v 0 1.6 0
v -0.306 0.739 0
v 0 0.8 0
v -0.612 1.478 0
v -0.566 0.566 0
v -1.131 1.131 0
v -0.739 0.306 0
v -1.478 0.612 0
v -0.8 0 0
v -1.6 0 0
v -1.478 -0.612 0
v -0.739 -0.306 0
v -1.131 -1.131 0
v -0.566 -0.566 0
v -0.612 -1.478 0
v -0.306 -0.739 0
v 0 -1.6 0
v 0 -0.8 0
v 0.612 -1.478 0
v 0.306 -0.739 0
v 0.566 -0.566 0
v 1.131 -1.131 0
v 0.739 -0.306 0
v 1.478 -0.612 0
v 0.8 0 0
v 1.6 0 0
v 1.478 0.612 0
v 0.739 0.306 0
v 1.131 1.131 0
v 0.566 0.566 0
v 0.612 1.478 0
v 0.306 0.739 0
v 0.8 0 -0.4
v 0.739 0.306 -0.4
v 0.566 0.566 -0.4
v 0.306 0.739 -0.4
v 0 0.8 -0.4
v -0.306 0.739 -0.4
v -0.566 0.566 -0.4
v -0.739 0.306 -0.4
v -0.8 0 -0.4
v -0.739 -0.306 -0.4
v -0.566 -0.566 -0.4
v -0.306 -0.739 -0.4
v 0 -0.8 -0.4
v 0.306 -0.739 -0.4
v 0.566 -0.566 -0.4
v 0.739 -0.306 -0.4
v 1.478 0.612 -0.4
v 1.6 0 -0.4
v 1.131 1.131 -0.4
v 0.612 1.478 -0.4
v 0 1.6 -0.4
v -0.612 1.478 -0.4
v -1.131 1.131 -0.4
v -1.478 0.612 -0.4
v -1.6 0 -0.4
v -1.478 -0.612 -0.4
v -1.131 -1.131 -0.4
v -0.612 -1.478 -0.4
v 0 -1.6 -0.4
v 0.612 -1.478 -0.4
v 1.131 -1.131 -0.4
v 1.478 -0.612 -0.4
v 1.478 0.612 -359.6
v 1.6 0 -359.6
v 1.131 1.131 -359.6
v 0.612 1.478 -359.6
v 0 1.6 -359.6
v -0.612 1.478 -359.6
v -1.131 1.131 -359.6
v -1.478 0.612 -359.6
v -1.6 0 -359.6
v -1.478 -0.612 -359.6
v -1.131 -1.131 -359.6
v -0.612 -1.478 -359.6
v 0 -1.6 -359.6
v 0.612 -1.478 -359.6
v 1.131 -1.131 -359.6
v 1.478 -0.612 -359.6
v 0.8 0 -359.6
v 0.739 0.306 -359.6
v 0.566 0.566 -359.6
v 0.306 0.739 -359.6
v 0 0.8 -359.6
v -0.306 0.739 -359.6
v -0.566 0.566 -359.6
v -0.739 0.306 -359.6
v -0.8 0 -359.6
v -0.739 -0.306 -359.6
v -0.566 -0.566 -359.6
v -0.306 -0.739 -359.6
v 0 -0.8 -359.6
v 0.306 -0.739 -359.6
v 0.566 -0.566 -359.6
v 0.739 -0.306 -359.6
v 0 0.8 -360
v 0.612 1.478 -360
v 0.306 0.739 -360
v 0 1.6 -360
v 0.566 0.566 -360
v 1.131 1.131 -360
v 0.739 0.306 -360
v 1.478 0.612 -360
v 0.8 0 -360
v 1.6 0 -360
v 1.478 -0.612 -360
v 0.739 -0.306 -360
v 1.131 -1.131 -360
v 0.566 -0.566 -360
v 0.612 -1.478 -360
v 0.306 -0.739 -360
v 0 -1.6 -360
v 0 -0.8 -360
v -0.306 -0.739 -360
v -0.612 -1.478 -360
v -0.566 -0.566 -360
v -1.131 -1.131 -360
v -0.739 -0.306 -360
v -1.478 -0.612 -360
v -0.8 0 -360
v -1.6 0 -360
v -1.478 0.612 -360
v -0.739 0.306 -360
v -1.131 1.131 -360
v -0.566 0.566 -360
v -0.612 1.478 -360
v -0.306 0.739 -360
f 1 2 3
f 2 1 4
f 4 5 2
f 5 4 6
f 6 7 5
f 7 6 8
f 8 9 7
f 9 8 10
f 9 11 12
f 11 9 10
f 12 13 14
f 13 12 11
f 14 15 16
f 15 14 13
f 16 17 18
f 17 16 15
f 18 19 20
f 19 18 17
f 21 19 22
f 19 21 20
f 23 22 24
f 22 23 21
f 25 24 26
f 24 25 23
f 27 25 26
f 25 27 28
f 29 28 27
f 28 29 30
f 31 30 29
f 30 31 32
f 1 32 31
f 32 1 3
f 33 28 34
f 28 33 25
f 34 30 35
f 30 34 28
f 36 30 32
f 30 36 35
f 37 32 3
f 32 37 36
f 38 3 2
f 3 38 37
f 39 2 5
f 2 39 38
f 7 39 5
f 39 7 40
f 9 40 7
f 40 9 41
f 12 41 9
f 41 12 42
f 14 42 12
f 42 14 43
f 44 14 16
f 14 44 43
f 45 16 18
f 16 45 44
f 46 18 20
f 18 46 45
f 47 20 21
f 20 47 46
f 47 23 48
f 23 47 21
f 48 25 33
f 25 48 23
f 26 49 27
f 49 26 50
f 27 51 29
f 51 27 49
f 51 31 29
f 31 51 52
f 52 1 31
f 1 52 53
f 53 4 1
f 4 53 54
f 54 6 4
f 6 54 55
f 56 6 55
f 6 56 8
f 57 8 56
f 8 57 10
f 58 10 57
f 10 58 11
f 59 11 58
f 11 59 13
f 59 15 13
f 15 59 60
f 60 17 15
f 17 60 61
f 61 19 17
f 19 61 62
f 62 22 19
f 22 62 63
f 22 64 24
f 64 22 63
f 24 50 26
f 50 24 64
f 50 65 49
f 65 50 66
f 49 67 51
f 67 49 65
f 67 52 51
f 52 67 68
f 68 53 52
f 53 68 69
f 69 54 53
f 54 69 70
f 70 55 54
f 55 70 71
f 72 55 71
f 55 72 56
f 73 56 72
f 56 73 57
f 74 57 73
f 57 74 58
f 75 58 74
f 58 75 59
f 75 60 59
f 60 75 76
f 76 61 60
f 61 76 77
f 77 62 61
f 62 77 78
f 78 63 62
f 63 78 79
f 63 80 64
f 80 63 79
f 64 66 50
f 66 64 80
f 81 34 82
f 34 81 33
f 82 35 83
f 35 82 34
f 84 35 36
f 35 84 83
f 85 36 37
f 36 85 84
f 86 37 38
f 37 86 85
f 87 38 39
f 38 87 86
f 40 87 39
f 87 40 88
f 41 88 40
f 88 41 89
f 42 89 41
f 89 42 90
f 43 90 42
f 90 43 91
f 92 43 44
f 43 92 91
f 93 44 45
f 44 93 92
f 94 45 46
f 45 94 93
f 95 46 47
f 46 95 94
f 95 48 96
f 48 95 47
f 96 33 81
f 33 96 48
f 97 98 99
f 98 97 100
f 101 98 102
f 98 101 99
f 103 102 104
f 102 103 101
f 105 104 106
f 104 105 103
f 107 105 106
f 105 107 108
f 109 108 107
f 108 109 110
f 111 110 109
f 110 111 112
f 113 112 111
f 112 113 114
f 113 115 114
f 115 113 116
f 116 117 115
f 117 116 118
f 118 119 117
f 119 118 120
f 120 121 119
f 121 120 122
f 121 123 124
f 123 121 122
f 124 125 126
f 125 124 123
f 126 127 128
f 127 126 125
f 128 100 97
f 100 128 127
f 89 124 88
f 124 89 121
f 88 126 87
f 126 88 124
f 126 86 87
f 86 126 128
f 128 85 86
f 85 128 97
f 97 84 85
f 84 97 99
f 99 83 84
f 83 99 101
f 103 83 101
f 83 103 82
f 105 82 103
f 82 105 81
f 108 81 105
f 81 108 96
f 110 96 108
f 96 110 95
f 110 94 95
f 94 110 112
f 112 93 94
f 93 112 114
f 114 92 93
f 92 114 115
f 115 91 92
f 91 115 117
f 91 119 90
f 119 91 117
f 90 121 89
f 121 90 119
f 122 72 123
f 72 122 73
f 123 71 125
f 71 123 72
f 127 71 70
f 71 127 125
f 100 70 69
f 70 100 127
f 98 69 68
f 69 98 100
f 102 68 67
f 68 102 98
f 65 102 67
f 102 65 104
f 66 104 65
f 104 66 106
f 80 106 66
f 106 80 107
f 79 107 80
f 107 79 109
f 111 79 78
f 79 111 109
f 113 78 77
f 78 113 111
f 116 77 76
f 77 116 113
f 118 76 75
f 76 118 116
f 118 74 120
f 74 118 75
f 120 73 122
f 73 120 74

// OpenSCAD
// file: ../p/4-4ring1.scad
use <../lib.scad>
function ldraw_lib__4_4ring1() = [
// 0 Ring  1 x 1.0
// 0 Name: 4-4ring1.dat
// 0 Author: James Jessiman
// 0 !LDRAW_ORG Primitive UPDATE 2009-01
// 0 !LICENSE Licensed under CC BY 2.0 and CC BY 4.0 : see CAreadme.txt
// 
// 0 BFC CERTIFY CCW
  [0,"BFC","CERTIFY"],
  [0,"BFC","CCW"],
// 
// 0 !HISTORY 1998-12-15 [PTadmin] Official Update 1998-10
// 0 !HISTORY 2002-04-08 [BrickCaster] Modified for BFC compliance
// 0 !HISTORY 2002-04-25 [PTadmin] Official Update 2002-02
// 0 !HISTORY 2007-06-24 [PTadmin] Header formatted for Contributor Agreement
// 0 !HISTORY 2008-07-01 [PTadmin] Official Update 2008-01
// 0 !HISTORY 2008-08-26 [cwdee] Switch polygon winding and rename
// 0 !HISTORY 2009-05-02 [PTadmin] Official Update 2009-01
// 
// 
// 4 16 -0.7654 0 1.8478 -0.3827 0 0.9239 0 0 1 0 0 2
  [4,16,-0.7654,0,1.8478,-0.3827,0,0.9239,0,0,1,0,0,2],
// 4 16 -1.4142 0 1.4142 -0.7071 0 0.7071 -0.3827 0 0.9239 -0.7654 0 1.8478
  [4,16,-1.4142,0,1.4142,-0.7071,0,0.7071,-0.3827,0,0.9239,-0.7654,0,1.8478],
// 4 16 -1.8478 0 0.7654 -0.9239 0 0.3827 -0.7071 0 0.7071 -1.4142 0 1.41420
  [4,16,-1.8478,0,0.7654,-0.9239,0,0.3827,-0.7071,0,0.7071,-1.4142,0,1.41420],
// 4 16 -2 0 0 -1 0 0 -0.9239 0 0.3827 -1.8478 0 0.7654
  [4,16,-2,0,0,-1,0,0,-0.9239,0,0.3827,-1.8478,0,0.7654],
// 4 16 -1.8478 0 -0.7654 -0.9239 0 -0.3827 -1 0 0 -2 0 0
  [4,16,-1.8478,0,-0.7654,-0.9239,0,-0.3827,-1,0,0,-2,0,0],
// 4 16 -1.4142 0 -1.4142 -0.7071 0 -0.7071 -0.9239 0 -0.3827 -1.8478 0 -0.7654
  [4,16,-1.4142,0,-1.4142,-0.7071,0,-0.7071,-0.9239,0,-0.3827,-1.8478,0,-0.7654],
// 4 16 -0.7654 0 -1.8478 -0.3827 0 -0.9239 -0.7071 0 -0.7071 -1.4142 0 -1.4142
  [4,16,-0.7654,0,-1.8478,-0.3827,0,-0.9239,-0.7071,0,-0.7071,-1.4142,0,-1.4142],
// 4 16 0 0 -2 0 0 -1 -0.3827 0 -0.9239 -0.7654 0 -1.8478
  [4,16,0,0,-2,0,0,-1,-0.3827,0,-0.9239,-0.7654,0,-1.8478],
// 4 16 0.7654 0 -1.8478 0.3827 0 -0.9239 0 0 -1 0 0 -2
  [4,16,0.7654,0,-1.8478,0.3827,0,-0.9239,0,0,-1,0,0,-2],
// 4 16 1.4142 0 -1.4142 0.7071 0 -0.7071 0.3827 0 -0.9239 0.7654 0 -1.8478
  [4,16,1.4142,0,-1.4142,0.7071,0,-0.7071,0.3827,0,-0.9239,0.7654,0,-1.8478],
// 4 16 1.8478 0 -0.7654 0.9239 0 -0.3827 0.7071 0 -0.7071 1.4142 0 -1.4142
  [4,16,1.8478,0,-0.7654,0.9239,0,-0.3827,0.7071,0,-0.7071,1.4142,0,-1.4142],
// 4 16 2 0 0 1 0 0 0.9239 0 -0.3827 1.8478 0 -0.7654
  [4,16,2,0,0,1,0,0,0.9239,0,-0.3827,1.8478,0,-0.7654],
// 4 16 1.8478 0 0.7654 0.9239 0 0.3827 1 0 0 2 0 0
  [4,16,1.8478,0,0.7654,0.9239,0,0.3827,1,0,0,2,0,0],
// 4 16 1.4142 0 1.4142 0.7071 0 0.7071 0.9239 0 0.3827 1.8478 0 0.7654
  [4,16,1.4142,0,1.4142,0.7071,0,0.7071,0.9239,0,0.3827,1.8478,0,0.7654],
// 4 16 0.7654 0 1.8478 0.3827 0 0.9239 0.7071 0 0.7071 1.4142 0 1.4142
  [4,16,0.7654,0,1.8478,0.3827,0,0.9239,0.7071,0,0.7071,1.4142,0,1.4142],
// 4 16 0 0 2 0 0 1 0.3827 0 0.9239 0.7654 0 1.8478
  [4,16,0,0,2,0,0,1,0.3827,0,0.9239,0.7654,0,1.8478],
// 0
];
module ldraw_lib__4_4ring1(step=0, col=false, unit=2/5, alt=false, line=0.2, solid=!$preview)
    makepoly(ldraw_lib__4_4ring1(), step=step, col=col, unit=unit, alt=alt, line=line, solid=solid);
ldraw_lib__4_4ring1(line=0.2);
// file: ../p/4-4edge.scad
use <../lib.scad>
function ldraw_lib__4_4edge() = [
// 0 Circle 1.0
// 0 Name: 4-4edge.dat
// 0 Author: James Jessiman
// 0 !LDRAW_ORG Primitive UPDATE 2017-01
// 0 !LICENSE Licensed under CC BY 2.0 and CC BY 4.0 : see CAreadme.txt
// 
// 0 BFC CERTIFY CCW
  [0,"BFC","CERTIFY"],
  [0,"BFC","CCW"],
// 
// 0 !HISTORY 1998-12-15 [PTadmin] Official Update 1998-10
// 0 !HISTORY 2005-12-28 [PTadmin] Official Update 2005-01
// 0 !HISTORY 2007-06-24 [PTadmin] Header formatted for Contributor Agreement
// 0 !HISTORY 2008-07-01 [PTadmin] Official Update 2008-01
// 0 !HISTORY 2017-01-15 [Steffen] BFCed
// 0 !HISTORY 2017-12-30 [PTadmin] Official Update 2017-01
// 
// 
// 2 24 1 0 0 0.9239 0 0.3827
  [2,24,1,0,0,0.9239,0,0.3827],
// 2 24 0.9239 0 0.3827 0.7071 0 0.7071
  [2,24,0.9239,0,0.3827,0.7071,0,0.7071],
// 2 24 0.7071 0 0.7071 0.3827 0 0.9239
  [2,24,0.7071,0,0.7071,0.3827,0,0.9239],
// 2 24 0.3827 0 0.9239 0 0 1
  [2,24,0.3827,0,0.9239,0,0,1],
// 2 24 0 0 1 -0.3827 0 0.9239
  [2,24,0,0,1,-0.3827,0,0.9239],
// 2 24 -0.3827 0 0.9239 -0.7071 0 0.7071
  [2,24,-0.3827,0,0.9239,-0.7071,0,0.7071],
// 2 24 -0.7071 0 0.7071 -0.9239 0 0.3827
  [2,24,-0.7071,0,0.7071,-0.9239,0,0.3827],
// 2 24 -0.9239 0 0.3827 -1 0 -0
  [2,24,-0.9239,0,0.3827,-1,0,-0],
// 2 24 -1 0 -0 -0.9239 0 -0.3827
  [2,24,-1,0,-0,-0.9239,0,-0.3827],
// 2 24 -0.9239 0 -0.3827 -0.7071 0 -0.7071
  [2,24,-0.9239,0,-0.3827,-0.7071,0,-0.7071],
// 2 24 -0.7071 0 -0.7071 -0.3827 0 -0.9239
  [2,24,-0.7071,0,-0.7071,-0.3827,0,-0.9239],
// 2 24 -0.3827 0 -0.9239 0 0 -1
  [2,24,-0.3827,0,-0.9239,0,0,-1],
// 2 24 0 0 -1 0.3827 0 -0.9239
  [2,24,0,0,-1,0.3827,0,-0.9239],
// 2 24 0.3827 0 -0.9239 0.7071 0 -0.7071
  [2,24,0.3827,0,-0.9239,0.7071,0,-0.7071],
// 2 24 0.7071 0 -0.7071 0.9239 0 -0.3827
  [2,24,0.7071,0,-0.7071,0.9239,0,-0.3827],
// 2 24 0.9239 0 -0.3827 1 0 0
  [2,24,0.9239,0,-0.3827,1,0,0],
];
module ldraw_lib__4_4edge(step=0, col=false, unit=2/5, alt=false, line=0.2, solid=!$preview)
    makepoly(ldraw_lib__4_4edge(), step=step, col=col, unit=unit, alt=alt, line=line, solid=solid);
ldraw_lib__4_4edge(line=0.2);
// file: ../p/4-4cyli.scad
use <../lib.scad>
function ldraw_lib__4_4cyli() = [
// 0 Cylinder 1.0
// 0 Name: 4-4cyli.dat
// 0 Author: James Jessiman
// 0 !LDRAW_ORG Primitive UPDATE 2005-01
// 0 !LICENSE Licensed under CC BY 2.0 and CC BY 4.0 : see CAreadme.txt
// 
// 0 BFC CERTIFY CCW
  [0,"BFC","CERTIFY"],
  [0,"BFC","CCW"],
// 
// 0 !HISTORY 1998-12-15 [PTadmin] Official Update 1998-10
// 0 !HISTORY 2002-03-23 [sbliss] Added BFC statement; merged headers from files in distributions LDraw 0.27 and Complete.
// 0 !HISTORY 2002-04-25 [PTadmin] Official Update 2002-02
// 0 !HISTORY 2004-12-14 [guyvivan] BFC CCW
// 0 !HISTORY 2005-12-28 [PTadmin] Official Update 2005-01
// 0 !HISTORY 2007-06-24 [PTadmin] Header formatted for Contributor Agreement
// 0 !HISTORY 2008-07-01 [PTadmin] Official Update 2008-01
// 
// 
// 4 16 1 1 0 0.9239 1 0.3827 0.9239 0 0.3827 1 0 0
  [4,16,1,1,0,0.9239,1,0.3827,0.9239,0,0.3827,1,0,0],
// 5 24 1 0 0 1 1 0 0.9239 0 0.3827 0.9239 0 -0.3827
  [5,24,1,0,0,1,1,0,0.9239,0,0.3827,0.9239,0,-0.3827],
// 4 16 0.9239 1 0.3827 0.7071 1 0.7071 0.7071 0 0.7071 0.9239 0 0.3827
  [4,16,0.9239,1,0.3827,0.7071,1,0.7071,0.7071,0,0.7071,0.9239,0,0.3827],
// 5 24 0.9239 0 0.3827 0.9239 1 0.3827 0.7071 0 0.7071 1 0 0
  [5,24,0.9239,0,0.3827,0.9239,1,0.3827,0.7071,0,0.7071,1,0,0],
// 4 16 0.7071 1 0.7071 0.3827 1 0.9239 0.3827 0 0.9239 0.7071 0 0.7071
  [4,16,0.7071,1,0.7071,0.3827,1,0.9239,0.3827,0,0.9239,0.7071,0,0.7071],
// 5 24 0.7071 0 0.7071 0.7071 1 0.7071 0.3827 0 0.9239 0.9239 0 0.3827
  [5,24,0.7071,0,0.7071,0.7071,1,0.7071,0.3827,0,0.9239,0.9239,0,0.3827],
// 4 16 0.3827 1 0.9239 0 1 1 0 0 1 0.3827 0 0.9239
  [4,16,0.3827,1,0.9239,0,1,1,0,0,1,0.3827,0,0.9239],
// 5 24 0.3827 0 0.9239 0.3827 1 0.9239 0 0 1 0.7071 0 0.7071
  [5,24,0.3827,0,0.9239,0.3827,1,0.9239,0,0,1,0.7071,0,0.7071],
// 4 16 0 1 1 -0.3827 1 0.9239 -0.3827 0 0.9239 0 0 1
  [4,16,0,1,1,-0.3827,1,0.9239,-0.3827,0,0.9239,0,0,1],
// 5 24 0 0 1 0 1 1 -0.3827 0 0.9239 0.3827 0 0.9239
  [5,24,0,0,1,0,1,1,-0.3827,0,0.9239,0.3827,0,0.9239],
// 4 16 -0.3827 1 0.9239 -0.7071 1 0.7071 -0.7071 0 0.7071 -0.3827 0 0.9239
  [4,16,-0.3827,1,0.9239,-0.7071,1,0.7071,-0.7071,0,0.7071,-0.3827,0,0.9239],
// 5 24 -0.3827 0 0.9239 -0.3827 1 0.9239 -0.7071 0 0.7071 0 0 1
  [5,24,-0.3827,0,0.9239,-0.3827,1,0.9239,-0.7071,0,0.7071,0,0,1],
// 4 16 -0.7071 1 0.7071 -0.9239 1 0.3827 -0.9239 0 0.3827 -0.7071 0 0.7071
  [4,16,-0.7071,1,0.7071,-0.9239,1,0.3827,-0.9239,0,0.3827,-0.7071,0,0.7071],
// 5 24 -0.7071 0 0.7071 -0.7071 1 0.7071 -0.9239 0 0.3827 -0.3827 0 0.9239
  [5,24,-0.7071,0,0.7071,-0.7071,1,0.7071,-0.9239,0,0.3827,-0.3827,0,0.9239],
// 4 16 -0.9239 1 0.3827 -1 1 0 -1 0 0 -0.9239 0 0.3827
  [4,16,-0.9239,1,0.3827,-1,1,0,-1,0,0,-0.9239,0,0.3827],
// 5 24 -0.9239 0 0.3827 -0.9239 1 0.3827 -1 0 0 -0.7071 0 0.7071
  [5,24,-0.9239,0,0.3827,-0.9239,1,0.3827,-1,0,0,-0.7071,0,0.7071],
// 4 16 -1 1 0 -0.9239 1 -0.3827 -0.9239 0 -0.3827 -1 0 0
  [4,16,-1,1,0,-0.9239,1,-0.3827,-0.9239,0,-0.3827,-1,0,0],
// 5 24 -1 0 0 -1 1 0 -0.9239 0 -0.3827 -0.9239 0 0.3827
  [5,24,-1,0,0,-1,1,0,-0.9239,0,-0.3827,-0.9239,0,0.3827],
// 4 16 -0.9239 1 -0.3827 -0.7071 1 -0.7071 -0.7071 0 -0.7071 -0.9239 0 -0.3827
  [4,16,-0.9239,1,-0.3827,-0.7071,1,-0.7071,-0.7071,0,-0.7071,-0.9239,0,-0.3827],
// 5 24 -0.9239 0 -0.3827 -0.9239 1 -0.3827 -0.7071 0 -0.7071 -1 0 0
  [5,24,-0.9239,0,-0.3827,-0.9239,1,-0.3827,-0.7071,0,-0.7071,-1,0,0],
// 4 16 -0.7071 1 -0.7071 -0.3827 1 -0.9239 -0.3827 0 -0.9239 -0.7071 0 -0.7071
  [4,16,-0.7071,1,-0.7071,-0.3827,1,-0.9239,-0.3827,0,-0.9239,-0.7071,0,-0.7071],
// 5 24 -0.7071 0 -0.7071 -0.7071 1 -0.7071 -0.3827 0 -0.9239 -0.9239 0 -0.3827
  [5,24,-0.7071,0,-0.7071,-0.7071,1,-0.7071,-0.3827,0,-0.9239,-0.9239,0,-0.3827],
// 4 16 -0.3827 1 -0.9239 0 1 -1 0 0 -1 -0.3827 0 -0.9239
  [4,16,-0.3827,1,-0.9239,0,1,-1,0,0,-1,-0.3827,0,-0.9239],
// 5 24 -0.3827 0 -0.9239 -0.3827 1 -0.9239 0 0 -1 -0.7071 0 -0.7071
  [5,24,-0.3827,0,-0.9239,-0.3827,1,-0.9239,0,0,-1,-0.7071,0,-0.7071],
// 4 16 0 1 -1 0.3827 1 -0.9239 0.3827 0 -0.9239 0 0 -1
  [4,16,0,1,-1,0.3827,1,-0.9239,0.3827,0,-0.9239,0,0,-1],
// 5 24 0 0 -1 0 1 -1 0.3827 0 -0.9239 -0.3827 0 -0.9239
  [5,24,0,0,-1,0,1,-1,0.3827,0,-0.9239,-0.3827,0,-0.9239],
// 4 16 0.3827 1 -0.9239 0.7071 1 -0.7071 0.7071 0 -0.7071 0.3827 0 -0.9239
  [4,16,0.3827,1,-0.9239,0.7071,1,-0.7071,0.7071,0,-0.7071,0.3827,0,-0.9239],
// 5 24 0.3827 0 -0.9239 0.3827 1 -0.9239 0.7071 0 -0.7071 0 0 -1
  [5,24,0.3827,0,-0.9239,0.3827,1,-0.9239,0.7071,0,-0.7071,0,0,-1],
// 4 16 0.7071 1 -0.7071 0.9239 1 -0.3827 0.9239 0 -0.3827 0.7071 0 -0.7071
  [4,16,0.7071,1,-0.7071,0.9239,1,-0.3827,0.9239,0,-0.3827,0.7071,0,-0.7071],
// 5 24 0.7071 0 -0.7071 0.7071 1 -0.7071 0.9239 0 -0.3827 0.3827 0 -0.9239
  [5,24,0.7071,0,-0.7071,0.7071,1,-0.7071,0.9239,0,-0.3827,0.3827,0,-0.9239],
// 4 16 0.9239 1 -0.3827 1 1 0 1 0 0 0.9239 0 -0.3827
  [4,16,0.9239,1,-0.3827,1,1,0,1,0,0,0.9239,0,-0.3827],
// 5 24 0.9239 0 -0.3827 0.9239 1 -0.3827 1 0 0 0.7071 0 -0.7071
  [5,24,0.9239,0,-0.3827,0.9239,1,-0.3827,1,0,0,0.7071,0,-0.7071],
// 0
];
module ldraw_lib__4_4cyli(step=0, col=false, unit=2/5, alt=false, line=0.2, solid=!$preview)
    makepoly(ldraw_lib__4_4cyli(), step=step, col=col, unit=unit, alt=alt, line=line, solid=solid);
ldraw_lib__4_4cyli(line=0.2);
// file: u9053.scad
use <../lib.scad>
use <../p/4-4cyli.scad>
use <../p/4-4edge.scad>
use <../p/4-4ring1.scad>
function ldraw_lib__u9053() = [
// 0 ~Technic Flex-System Hose End
// 0 Name: u9053.dat
// 0 Author: William Howard [WilliamH]
// 0 !LDRAW_ORG Part UPDATE 2011-02
// 0 !LICENSE Licensed under CC BY 2.0 and CC BY 4.0 : see CAreadme.txt
// 
// 0 BFC CERTIFY CCW
  [0,"BFC","CERTIFY"],
  [0,"BFC","CCW"],
// 
// 0 !HISTORY 2011-12-21 [cwdee] Reworked subparting technique
// 0 !HISTORY 2011-12-23 [PTadmin] Renamed from 76
// 0 !HISTORY 2011-12-29 [PTadmin] Official Update 2011-02
// 
// 
// 1 16 0 0 0 2 0 0 0 1 0 0 0 2 4-4ring1.dat
  [1,16,0,0,0,2,0,0,0,1,0,0,0,2, ldraw_lib__4_4ring1()],
// 1 16 0 0 0 2 0 0 0 1 0 0 0 2 4-4edge.dat
  [1,16,0,0,0,2,0,0,0,1,0,0,0,2, ldraw_lib__4_4edge()],
// 0 BFC INVERTNEXT
  [0,"BFC","INVERTNEXT"],
// 1 16 0 0 0 2 0 0 0 1 0 0 0 2 4-4cyli.dat
  [1,16,0,0,0,2,0,0,0,1,0,0,0,2, ldraw_lib__4_4cyli()],
// 1 16 0 0 0 4 0 0 0 1 0 0 0 4 4-4edge.dat
  [1,16,0,0,0,4,0,0,0,1,0,0,0,4, ldraw_lib__4_4edge()],
// 1 16 0 0 0 4 0 0 0 1 0 0 0 4 4-4cyli.dat
  [1,16,0,0,0,4,0,0,0,1,0,0,0,4, ldraw_lib__4_4cyli()],
// 0
];
module ldraw_lib__u9053(step=0, col=false, unit=2/5, alt=false, line=0.2, solid=!$preview)
    makepoly(ldraw_lib__u9053(), step=step, col=col, unit=unit, alt=alt, line=line, solid=solid);
ldraw_lib__u9053(line=0.2);
// file: 77.scad
use <../lib.scad>
use <../p/4-4cyli.scad>
function ldraw_lib__77() = [
// 0 ~Technic Flex-System Hose Segment
// 0 Name: 77.dat
// 0 Author: William Howard [WilliamH]
// 0 !LDRAW_ORG Part UPDATE 2011-02
// 0 !LICENSE Licensed under CC BY 2.0 and CC BY 4.0 : see CAreadme.txt
// 
// 0 BFC CERTIFY CCW
  [0,"BFC","CERTIFY"],
  [0,"BFC","CCW"],
// 
// 0 !HISTORY 2011-12-21 [cwdee] Reworked subparting technique
// 0 !HISTORY 2011-12-29 [PTadmin] Official Update 2011-02
// 
// 
// 1 16 0 0 0 4 0 0 0 1 0 0 0 4 4-4cyli.dat
  [1,16,0,0,0,4,0,0,0,1,0,0,0,4, ldraw_lib__4_4cyli()],
// 0 BFC INVERTNEXT
  [0,"BFC","INVERTNEXT"],
// 1 16 0 0 0 2 0 0 0 1 0 0 0 2 4-4cyli.dat
  [1,16,0,0,0,2,0,0,0,1,0,0,0,2, ldraw_lib__4_4cyli()],
// 0
];
module ldraw_lib__77(step=0, col=false, unit=2/5, alt=false, line=0.2, solid=!$preview)
    makepoly(ldraw_lib__77(), step=step, col=col, unit=unit, alt=alt, line=line, solid=solid);
ldraw_lib__77(line=0.2);
// main file
use <../lib.scad>
use <77.scad>
use <u9053.scad>
function ldraw_lib__76281() = [
// 0 Technic Flex-System Hose 45L (900LDU)
// 0 Name: 76281.dat
// 0 Author: Tim Gould [timgould]
// 0 !LDRAW_ORG Part UPDATE 2011-02
// 0 !LICENSE Licensed under CC BY 2.0 and CC BY 4.0 : see CAreadme.txt
// 
// 0 BFC CERTIFY CCW
  [0,"BFC","CERTIFY"],
  [0,"BFC","CCW"],
// 
// 0 !KEYWORDS bar, tube
// 
// 0 !HISTORY 2011-12-29 [PTadmin] Official Update 2011-02
// 
// 
// 1 16 0 0 0 1 0 0 0 1 0 0 0 1 u9053.dat
  [1,16,0,0,0,1,0,0,0,1,0,0,0,1, ldraw_lib__u9053()],
// 1 16 0 1 0 1 0 0 0 898 0 0 0 1 77.dat
  [1,16,0,1,0,1,0,0,0,898,0,0,0,1, ldraw_lib__77()],
// 1 16 0 900 0 -1 0 0 0 -1 0 0 0 1 u9053.dat
  [1,16,0,900,0,-1,0,0,0,-1,0,0,0,1, ldraw_lib__u9053()],
];
module ldraw_lib__76281(step=0, col=false, unit=2/5, alt=false, line=0.2, solid=!$preview)
    makepoly(ldraw_lib__76281(), step=step, col=col, unit=unit, alt=alt, line=line, solid=solid);
ldraw_lib__76281(line=0.2);
